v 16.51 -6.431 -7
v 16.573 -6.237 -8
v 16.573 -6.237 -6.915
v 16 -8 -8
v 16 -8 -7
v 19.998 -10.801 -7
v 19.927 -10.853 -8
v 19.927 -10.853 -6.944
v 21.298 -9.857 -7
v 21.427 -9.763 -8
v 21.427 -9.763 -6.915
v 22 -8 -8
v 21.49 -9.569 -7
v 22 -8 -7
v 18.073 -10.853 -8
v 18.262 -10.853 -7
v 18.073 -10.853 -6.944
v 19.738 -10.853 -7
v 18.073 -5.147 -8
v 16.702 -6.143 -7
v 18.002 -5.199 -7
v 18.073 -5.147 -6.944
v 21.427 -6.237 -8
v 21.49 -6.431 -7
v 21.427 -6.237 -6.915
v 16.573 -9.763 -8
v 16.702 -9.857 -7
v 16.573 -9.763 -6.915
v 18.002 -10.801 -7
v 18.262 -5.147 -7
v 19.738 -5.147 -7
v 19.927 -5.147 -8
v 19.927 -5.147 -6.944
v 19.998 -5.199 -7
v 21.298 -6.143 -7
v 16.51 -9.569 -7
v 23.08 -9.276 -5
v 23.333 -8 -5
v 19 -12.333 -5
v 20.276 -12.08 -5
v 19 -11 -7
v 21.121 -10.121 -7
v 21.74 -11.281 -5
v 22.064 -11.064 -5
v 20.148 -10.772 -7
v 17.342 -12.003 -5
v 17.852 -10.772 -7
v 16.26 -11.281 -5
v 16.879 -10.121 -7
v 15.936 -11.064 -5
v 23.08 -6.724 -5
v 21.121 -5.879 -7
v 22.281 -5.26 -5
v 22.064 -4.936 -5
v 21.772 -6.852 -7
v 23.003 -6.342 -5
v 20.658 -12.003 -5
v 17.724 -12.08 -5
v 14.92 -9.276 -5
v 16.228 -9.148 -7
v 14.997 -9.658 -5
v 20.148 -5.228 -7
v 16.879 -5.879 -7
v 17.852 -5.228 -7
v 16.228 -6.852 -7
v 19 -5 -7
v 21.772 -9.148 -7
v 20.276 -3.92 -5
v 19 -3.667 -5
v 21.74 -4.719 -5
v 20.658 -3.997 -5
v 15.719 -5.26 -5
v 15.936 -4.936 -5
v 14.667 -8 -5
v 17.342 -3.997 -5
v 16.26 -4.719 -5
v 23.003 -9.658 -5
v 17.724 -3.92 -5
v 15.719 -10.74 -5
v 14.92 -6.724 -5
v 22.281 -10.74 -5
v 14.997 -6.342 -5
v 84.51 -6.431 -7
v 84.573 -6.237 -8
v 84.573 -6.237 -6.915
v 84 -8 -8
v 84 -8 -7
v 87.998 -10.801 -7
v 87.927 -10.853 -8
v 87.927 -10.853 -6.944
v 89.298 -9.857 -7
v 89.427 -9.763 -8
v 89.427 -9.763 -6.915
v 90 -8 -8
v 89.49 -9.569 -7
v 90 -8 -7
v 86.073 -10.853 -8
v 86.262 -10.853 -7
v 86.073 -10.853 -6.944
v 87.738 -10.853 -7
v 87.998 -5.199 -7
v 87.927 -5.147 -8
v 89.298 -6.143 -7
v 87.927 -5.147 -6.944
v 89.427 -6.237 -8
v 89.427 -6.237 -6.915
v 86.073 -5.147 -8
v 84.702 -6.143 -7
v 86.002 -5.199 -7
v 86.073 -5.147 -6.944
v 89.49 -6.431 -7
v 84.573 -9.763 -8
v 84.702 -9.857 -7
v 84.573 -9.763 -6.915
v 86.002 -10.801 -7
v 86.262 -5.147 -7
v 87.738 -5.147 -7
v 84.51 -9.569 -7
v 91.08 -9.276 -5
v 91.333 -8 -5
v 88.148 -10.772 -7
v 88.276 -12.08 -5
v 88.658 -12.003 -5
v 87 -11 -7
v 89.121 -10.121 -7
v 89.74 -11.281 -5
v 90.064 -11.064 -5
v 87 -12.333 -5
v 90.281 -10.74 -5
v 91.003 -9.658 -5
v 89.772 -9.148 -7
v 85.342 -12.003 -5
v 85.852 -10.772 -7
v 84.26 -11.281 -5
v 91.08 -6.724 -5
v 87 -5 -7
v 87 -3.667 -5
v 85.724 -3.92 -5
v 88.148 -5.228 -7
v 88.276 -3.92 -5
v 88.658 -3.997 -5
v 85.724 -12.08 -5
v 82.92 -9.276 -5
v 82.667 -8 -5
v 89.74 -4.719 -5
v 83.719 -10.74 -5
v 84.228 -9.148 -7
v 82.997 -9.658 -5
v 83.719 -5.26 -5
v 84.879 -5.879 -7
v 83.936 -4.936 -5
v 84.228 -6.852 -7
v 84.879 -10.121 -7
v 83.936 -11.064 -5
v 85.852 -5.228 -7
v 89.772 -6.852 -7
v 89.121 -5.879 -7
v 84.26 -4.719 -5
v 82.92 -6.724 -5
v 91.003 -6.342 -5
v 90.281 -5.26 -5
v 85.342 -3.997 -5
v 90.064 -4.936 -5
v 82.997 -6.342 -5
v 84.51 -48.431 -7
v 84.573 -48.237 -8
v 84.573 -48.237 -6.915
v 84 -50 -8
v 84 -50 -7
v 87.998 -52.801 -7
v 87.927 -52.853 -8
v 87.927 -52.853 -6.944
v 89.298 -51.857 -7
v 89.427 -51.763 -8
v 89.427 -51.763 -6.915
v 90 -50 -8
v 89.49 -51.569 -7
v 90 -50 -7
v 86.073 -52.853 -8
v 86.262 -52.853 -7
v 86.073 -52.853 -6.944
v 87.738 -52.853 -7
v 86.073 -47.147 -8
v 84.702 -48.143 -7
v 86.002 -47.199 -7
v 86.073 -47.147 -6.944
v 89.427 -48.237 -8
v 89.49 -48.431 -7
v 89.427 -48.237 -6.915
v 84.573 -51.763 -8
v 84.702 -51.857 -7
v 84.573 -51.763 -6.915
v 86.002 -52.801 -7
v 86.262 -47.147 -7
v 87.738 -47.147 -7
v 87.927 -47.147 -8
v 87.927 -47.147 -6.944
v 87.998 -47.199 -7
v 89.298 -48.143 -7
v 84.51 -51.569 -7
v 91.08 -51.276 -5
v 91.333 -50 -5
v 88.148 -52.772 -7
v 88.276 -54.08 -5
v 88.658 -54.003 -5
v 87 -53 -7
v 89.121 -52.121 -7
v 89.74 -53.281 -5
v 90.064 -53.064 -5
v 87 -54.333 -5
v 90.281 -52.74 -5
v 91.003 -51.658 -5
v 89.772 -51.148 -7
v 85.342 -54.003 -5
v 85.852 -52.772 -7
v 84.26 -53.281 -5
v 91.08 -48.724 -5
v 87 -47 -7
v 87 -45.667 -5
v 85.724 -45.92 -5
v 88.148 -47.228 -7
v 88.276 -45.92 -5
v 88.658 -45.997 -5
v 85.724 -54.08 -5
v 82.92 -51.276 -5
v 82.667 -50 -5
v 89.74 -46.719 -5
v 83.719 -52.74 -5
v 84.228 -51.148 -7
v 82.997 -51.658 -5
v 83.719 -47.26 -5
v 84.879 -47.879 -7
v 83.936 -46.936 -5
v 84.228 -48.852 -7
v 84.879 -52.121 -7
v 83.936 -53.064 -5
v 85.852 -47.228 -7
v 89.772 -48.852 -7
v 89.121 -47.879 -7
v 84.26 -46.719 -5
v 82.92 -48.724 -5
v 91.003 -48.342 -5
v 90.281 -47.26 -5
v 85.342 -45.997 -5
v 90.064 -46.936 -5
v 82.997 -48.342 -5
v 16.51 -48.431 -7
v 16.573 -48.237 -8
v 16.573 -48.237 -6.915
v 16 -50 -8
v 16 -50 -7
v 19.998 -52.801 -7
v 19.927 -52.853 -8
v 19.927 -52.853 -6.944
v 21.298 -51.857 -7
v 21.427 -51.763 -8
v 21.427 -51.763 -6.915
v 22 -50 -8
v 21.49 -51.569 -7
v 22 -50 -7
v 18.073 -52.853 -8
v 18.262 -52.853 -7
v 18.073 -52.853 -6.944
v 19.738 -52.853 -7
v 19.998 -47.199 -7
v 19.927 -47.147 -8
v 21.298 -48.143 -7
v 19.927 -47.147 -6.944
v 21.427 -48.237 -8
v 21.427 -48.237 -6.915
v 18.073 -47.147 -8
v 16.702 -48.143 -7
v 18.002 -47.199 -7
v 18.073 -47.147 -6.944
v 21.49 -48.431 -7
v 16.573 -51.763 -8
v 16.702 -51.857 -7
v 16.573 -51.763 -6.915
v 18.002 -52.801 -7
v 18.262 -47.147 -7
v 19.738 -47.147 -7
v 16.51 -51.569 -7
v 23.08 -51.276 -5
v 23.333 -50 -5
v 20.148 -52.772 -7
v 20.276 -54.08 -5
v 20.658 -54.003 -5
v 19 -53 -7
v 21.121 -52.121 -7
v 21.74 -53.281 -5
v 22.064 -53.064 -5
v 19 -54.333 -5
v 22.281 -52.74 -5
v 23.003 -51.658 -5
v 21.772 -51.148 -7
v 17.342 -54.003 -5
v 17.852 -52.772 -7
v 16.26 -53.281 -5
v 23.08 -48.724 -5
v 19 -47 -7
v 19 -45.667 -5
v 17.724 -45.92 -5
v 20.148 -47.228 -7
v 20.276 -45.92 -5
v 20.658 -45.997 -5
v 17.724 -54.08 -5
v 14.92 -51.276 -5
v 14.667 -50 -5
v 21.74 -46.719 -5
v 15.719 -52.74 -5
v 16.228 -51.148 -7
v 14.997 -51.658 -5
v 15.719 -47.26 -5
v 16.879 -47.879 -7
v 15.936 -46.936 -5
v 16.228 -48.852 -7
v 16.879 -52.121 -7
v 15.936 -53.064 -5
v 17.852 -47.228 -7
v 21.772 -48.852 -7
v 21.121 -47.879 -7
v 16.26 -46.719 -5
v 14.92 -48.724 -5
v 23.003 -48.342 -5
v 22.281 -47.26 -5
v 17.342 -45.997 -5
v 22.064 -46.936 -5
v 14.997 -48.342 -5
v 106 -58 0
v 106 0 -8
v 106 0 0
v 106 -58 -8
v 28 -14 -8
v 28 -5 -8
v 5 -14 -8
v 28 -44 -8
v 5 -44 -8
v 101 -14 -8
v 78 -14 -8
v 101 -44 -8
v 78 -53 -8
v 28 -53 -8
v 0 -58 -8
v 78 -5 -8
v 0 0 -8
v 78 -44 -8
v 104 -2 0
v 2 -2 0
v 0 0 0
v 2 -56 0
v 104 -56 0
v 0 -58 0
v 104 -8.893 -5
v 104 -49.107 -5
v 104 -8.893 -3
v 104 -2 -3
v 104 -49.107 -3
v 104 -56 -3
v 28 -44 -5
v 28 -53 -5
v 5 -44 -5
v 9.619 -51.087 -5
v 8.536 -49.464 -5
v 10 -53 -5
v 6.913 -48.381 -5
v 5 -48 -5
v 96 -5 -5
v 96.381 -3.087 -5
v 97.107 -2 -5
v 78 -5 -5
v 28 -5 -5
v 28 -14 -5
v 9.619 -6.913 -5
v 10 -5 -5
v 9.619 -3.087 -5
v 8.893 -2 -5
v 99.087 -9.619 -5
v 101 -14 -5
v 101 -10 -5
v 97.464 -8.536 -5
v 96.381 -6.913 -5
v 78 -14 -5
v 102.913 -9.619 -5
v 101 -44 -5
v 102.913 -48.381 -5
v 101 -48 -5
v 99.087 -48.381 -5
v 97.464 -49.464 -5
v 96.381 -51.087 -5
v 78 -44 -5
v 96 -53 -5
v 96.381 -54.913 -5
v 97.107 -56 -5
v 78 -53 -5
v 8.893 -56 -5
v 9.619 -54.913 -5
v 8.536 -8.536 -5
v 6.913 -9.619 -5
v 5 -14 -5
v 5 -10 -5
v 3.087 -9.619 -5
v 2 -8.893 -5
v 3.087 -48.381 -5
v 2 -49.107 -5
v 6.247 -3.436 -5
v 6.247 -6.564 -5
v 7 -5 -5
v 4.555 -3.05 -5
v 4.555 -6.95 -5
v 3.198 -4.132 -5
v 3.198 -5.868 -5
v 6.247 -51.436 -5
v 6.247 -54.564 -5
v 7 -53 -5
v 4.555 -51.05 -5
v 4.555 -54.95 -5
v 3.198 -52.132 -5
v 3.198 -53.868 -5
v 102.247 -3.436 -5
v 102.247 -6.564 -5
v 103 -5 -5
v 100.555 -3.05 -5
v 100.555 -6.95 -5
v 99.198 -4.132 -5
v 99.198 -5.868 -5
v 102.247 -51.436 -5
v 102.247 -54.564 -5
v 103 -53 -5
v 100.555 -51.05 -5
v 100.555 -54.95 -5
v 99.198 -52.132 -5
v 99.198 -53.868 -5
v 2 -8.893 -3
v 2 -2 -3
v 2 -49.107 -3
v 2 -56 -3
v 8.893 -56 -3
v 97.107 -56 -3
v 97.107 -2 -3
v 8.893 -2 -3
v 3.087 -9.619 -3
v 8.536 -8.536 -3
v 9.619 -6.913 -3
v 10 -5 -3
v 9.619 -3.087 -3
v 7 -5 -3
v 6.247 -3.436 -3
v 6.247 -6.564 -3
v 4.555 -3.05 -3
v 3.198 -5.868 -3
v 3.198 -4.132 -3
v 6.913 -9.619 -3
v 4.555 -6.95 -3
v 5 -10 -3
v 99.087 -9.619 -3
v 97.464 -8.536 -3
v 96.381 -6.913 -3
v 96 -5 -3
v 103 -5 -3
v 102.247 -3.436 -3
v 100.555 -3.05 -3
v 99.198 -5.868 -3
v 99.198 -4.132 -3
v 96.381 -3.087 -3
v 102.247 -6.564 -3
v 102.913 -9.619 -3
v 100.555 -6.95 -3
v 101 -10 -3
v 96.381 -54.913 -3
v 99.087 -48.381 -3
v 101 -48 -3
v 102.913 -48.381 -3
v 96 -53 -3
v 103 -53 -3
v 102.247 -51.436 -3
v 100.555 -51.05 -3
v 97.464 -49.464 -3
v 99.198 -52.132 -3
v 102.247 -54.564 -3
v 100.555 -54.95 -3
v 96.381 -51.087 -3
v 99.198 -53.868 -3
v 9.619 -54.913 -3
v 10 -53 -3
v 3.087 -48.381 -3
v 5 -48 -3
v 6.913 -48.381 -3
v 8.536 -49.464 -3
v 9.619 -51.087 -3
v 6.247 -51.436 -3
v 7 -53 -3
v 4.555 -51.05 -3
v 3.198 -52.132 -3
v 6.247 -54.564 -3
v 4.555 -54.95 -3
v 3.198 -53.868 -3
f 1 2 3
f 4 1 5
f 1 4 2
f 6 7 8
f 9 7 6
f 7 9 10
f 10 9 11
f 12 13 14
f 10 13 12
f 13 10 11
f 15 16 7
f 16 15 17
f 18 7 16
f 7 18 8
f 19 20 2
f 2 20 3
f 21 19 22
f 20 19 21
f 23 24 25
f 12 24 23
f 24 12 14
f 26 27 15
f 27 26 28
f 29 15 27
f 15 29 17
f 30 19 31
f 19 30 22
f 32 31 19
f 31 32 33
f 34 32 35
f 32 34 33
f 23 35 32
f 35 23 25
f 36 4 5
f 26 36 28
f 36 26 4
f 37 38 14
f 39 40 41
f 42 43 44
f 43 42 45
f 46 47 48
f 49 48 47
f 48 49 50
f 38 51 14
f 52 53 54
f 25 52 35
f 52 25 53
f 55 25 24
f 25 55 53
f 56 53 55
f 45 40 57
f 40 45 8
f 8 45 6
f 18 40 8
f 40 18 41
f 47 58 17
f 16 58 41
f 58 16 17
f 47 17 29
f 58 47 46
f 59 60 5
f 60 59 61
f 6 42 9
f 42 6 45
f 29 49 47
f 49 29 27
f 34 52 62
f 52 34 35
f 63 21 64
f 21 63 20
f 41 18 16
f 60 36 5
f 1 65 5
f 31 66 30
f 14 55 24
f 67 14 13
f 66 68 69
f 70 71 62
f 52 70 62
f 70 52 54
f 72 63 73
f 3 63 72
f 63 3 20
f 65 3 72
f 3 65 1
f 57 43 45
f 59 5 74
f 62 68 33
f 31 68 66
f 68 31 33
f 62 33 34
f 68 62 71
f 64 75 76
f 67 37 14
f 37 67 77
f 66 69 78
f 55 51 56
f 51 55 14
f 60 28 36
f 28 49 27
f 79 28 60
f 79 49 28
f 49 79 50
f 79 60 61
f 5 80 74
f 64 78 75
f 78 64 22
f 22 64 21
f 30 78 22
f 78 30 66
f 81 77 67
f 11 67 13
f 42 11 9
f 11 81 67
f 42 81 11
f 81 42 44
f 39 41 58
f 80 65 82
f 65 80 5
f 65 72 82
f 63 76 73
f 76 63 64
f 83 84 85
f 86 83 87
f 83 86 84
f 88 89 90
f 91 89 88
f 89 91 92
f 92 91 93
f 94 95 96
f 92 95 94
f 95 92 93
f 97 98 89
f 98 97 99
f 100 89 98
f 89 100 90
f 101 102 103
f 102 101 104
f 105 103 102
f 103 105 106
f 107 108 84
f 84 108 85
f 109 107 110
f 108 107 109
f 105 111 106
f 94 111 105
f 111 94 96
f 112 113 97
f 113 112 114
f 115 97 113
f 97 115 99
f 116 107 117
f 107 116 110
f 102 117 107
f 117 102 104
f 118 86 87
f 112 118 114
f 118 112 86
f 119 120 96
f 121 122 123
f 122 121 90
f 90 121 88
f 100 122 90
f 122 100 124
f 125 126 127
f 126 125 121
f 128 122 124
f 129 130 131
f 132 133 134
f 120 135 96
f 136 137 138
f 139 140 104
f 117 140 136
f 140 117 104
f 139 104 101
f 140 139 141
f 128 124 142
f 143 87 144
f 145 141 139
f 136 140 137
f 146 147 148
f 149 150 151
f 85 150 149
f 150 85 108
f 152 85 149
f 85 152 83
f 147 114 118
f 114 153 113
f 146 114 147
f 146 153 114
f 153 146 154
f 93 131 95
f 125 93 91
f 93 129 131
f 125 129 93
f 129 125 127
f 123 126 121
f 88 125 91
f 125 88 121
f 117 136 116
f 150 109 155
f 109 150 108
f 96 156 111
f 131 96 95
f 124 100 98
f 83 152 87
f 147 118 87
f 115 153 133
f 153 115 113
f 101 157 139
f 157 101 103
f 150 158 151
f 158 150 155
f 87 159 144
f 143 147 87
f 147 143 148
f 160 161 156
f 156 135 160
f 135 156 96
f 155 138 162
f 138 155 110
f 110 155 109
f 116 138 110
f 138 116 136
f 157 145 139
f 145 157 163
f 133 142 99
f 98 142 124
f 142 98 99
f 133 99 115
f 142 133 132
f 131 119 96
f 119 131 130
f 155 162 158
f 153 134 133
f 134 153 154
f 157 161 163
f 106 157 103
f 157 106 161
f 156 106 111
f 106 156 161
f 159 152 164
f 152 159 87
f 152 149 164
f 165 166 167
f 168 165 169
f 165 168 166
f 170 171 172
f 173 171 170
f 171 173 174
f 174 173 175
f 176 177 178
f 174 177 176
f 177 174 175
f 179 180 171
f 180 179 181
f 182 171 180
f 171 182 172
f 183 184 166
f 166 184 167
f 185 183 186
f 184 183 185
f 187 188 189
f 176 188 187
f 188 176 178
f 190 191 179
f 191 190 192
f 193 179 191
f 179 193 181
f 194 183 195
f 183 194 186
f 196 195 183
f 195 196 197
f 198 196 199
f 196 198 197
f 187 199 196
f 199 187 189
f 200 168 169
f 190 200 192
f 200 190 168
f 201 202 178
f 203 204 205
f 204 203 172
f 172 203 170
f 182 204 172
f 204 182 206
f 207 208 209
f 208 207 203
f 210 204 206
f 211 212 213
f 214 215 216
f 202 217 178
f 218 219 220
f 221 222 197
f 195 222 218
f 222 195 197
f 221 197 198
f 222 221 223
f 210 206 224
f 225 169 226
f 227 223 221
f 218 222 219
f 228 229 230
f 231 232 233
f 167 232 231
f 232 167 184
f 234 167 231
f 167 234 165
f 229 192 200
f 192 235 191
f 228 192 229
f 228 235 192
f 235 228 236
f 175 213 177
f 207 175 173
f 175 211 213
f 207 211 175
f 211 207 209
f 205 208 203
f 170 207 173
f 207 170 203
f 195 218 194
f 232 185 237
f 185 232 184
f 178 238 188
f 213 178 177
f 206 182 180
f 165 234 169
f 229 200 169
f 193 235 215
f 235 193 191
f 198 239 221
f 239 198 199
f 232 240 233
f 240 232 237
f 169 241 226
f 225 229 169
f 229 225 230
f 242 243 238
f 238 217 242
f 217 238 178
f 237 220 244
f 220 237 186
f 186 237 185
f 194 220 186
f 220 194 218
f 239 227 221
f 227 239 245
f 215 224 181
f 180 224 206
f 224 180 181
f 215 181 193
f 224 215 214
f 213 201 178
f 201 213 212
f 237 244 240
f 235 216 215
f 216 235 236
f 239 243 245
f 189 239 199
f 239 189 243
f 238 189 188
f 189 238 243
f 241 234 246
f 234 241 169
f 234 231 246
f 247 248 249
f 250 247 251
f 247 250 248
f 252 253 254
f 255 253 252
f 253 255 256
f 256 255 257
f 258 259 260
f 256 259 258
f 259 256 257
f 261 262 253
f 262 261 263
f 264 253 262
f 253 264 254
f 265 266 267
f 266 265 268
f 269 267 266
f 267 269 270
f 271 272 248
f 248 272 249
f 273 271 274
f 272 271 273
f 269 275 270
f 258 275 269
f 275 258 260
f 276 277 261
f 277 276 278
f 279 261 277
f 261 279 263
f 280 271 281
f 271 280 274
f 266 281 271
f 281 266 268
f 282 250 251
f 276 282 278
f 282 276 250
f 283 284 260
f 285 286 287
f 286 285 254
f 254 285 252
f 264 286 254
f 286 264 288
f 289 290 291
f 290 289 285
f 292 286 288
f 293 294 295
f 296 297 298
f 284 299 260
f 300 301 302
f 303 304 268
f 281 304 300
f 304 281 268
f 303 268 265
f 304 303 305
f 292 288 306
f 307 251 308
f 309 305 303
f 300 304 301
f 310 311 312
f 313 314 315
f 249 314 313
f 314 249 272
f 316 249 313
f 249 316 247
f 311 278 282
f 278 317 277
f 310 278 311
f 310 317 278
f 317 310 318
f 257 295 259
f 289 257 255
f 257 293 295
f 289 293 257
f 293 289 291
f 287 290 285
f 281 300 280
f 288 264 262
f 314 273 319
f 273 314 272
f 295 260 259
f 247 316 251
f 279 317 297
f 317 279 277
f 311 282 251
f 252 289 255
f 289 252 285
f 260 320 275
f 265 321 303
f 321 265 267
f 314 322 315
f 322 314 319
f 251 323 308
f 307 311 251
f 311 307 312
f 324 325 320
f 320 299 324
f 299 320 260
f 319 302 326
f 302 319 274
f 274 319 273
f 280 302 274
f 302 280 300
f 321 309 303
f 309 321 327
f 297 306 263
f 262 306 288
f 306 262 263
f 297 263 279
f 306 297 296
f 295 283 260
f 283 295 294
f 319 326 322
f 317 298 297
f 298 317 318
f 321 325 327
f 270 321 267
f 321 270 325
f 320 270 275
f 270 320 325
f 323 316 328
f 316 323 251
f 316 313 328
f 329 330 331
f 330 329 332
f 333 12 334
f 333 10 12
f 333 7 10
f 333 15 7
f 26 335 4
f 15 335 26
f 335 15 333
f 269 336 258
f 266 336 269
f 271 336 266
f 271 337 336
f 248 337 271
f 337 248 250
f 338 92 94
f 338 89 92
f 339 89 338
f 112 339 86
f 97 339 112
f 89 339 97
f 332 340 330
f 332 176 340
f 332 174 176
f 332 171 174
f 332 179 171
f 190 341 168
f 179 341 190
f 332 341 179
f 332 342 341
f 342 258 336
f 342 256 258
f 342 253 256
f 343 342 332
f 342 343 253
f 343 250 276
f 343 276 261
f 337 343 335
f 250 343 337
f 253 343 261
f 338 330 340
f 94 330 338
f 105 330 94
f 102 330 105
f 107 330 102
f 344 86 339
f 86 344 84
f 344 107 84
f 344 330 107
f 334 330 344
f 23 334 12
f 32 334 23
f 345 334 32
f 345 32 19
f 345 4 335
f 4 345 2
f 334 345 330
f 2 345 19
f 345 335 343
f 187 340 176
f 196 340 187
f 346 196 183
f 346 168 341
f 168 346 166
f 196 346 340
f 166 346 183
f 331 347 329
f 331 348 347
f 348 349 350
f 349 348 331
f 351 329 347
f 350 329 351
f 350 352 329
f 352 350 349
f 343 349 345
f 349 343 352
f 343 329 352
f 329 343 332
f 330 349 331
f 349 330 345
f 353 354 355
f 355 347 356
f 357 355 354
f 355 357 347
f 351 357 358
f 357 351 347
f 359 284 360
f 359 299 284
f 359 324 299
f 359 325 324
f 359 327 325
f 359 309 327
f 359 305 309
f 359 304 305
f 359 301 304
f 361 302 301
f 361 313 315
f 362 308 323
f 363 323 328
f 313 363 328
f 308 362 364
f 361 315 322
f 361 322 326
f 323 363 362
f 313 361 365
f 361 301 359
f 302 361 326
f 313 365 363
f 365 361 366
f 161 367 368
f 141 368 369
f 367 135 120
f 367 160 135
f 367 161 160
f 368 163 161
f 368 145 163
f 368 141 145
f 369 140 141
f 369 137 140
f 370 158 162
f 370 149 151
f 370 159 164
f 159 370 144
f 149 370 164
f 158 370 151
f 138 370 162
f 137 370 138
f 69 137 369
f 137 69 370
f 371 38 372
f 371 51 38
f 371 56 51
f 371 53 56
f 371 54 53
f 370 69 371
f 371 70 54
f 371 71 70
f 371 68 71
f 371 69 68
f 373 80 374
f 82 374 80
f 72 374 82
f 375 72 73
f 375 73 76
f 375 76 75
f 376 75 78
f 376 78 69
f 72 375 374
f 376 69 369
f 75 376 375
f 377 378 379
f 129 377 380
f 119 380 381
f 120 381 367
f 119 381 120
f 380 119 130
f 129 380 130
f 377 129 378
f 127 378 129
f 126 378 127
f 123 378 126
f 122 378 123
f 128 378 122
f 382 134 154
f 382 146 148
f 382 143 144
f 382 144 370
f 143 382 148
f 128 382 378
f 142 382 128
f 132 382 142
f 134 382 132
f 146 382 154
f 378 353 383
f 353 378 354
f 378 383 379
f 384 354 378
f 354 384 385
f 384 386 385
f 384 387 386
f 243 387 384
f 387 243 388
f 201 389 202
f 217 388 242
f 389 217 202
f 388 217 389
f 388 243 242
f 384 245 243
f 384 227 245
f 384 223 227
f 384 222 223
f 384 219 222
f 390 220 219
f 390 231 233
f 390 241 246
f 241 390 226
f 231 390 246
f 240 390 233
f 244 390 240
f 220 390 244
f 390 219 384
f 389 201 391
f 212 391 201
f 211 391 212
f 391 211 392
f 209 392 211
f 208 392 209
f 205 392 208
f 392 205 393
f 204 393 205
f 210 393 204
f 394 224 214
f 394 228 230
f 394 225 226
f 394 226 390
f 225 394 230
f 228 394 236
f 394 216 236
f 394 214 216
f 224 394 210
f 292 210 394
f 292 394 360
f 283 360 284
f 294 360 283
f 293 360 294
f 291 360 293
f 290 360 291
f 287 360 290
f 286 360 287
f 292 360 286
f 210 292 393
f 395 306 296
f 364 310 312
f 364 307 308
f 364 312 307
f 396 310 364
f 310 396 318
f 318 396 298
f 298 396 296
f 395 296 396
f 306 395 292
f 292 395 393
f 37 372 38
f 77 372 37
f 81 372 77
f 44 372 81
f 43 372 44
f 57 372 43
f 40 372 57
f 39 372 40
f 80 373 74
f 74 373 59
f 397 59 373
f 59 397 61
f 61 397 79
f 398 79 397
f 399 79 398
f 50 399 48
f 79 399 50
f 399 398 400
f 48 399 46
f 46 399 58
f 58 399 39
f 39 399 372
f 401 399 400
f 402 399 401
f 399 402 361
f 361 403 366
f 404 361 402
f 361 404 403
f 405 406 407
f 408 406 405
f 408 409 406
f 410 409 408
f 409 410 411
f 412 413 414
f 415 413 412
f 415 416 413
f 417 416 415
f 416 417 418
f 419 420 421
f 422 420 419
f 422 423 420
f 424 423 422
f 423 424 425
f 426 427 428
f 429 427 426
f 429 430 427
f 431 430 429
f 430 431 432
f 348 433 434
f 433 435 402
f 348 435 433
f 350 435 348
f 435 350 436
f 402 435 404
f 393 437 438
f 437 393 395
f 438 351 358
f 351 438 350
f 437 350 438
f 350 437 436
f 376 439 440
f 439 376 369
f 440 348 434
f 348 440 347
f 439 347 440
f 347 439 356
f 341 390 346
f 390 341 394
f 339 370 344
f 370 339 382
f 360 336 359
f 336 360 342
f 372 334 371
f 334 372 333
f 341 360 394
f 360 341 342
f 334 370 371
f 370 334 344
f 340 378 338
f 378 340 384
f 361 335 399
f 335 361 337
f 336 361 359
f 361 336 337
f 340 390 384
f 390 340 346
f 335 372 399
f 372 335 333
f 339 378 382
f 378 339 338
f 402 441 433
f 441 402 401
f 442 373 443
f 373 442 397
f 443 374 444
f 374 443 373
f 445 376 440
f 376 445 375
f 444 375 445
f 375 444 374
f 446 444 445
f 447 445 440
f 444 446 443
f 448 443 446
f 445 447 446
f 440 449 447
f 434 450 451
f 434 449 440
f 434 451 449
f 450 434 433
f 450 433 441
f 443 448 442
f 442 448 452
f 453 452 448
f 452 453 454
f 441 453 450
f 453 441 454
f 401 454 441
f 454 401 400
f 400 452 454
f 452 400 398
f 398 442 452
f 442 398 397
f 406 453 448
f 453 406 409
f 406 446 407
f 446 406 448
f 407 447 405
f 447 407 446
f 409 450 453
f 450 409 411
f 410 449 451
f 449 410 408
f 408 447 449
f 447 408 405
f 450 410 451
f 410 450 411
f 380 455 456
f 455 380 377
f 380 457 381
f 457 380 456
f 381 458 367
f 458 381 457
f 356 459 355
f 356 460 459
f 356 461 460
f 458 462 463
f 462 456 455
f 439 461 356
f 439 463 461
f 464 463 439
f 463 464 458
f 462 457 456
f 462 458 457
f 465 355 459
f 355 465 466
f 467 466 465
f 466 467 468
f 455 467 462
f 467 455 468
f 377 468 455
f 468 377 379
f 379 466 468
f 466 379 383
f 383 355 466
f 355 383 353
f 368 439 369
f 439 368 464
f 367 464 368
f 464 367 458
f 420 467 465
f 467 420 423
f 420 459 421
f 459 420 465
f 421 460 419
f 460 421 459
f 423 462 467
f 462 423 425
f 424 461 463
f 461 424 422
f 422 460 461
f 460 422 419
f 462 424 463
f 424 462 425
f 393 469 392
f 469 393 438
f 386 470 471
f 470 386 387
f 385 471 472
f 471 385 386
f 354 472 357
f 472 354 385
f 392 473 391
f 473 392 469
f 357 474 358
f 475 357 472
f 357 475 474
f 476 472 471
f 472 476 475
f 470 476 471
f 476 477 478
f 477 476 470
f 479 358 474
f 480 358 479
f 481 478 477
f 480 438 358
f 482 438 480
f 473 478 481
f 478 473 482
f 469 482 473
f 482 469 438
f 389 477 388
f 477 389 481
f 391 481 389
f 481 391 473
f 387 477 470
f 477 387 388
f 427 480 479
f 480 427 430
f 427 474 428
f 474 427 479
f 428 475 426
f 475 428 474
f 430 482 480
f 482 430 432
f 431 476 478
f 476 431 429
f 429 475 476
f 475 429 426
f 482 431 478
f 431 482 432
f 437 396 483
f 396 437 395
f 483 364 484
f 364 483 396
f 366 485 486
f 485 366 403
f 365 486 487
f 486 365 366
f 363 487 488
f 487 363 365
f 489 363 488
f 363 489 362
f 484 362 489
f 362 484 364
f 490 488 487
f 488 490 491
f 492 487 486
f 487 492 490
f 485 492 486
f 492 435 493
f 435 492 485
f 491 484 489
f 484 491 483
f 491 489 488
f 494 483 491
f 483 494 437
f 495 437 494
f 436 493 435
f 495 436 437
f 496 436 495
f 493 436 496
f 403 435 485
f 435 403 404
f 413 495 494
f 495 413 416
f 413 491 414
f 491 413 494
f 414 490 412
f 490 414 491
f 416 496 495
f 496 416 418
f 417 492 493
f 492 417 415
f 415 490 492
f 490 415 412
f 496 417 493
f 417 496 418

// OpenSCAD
// [FL_INDEX: keywords="openscad, 3d_parametric, PCB_Mounter, csg_solid" | COT="Parametric OpenSCAD design from 3DCodeverse"]
// Title: PCB Mounter

// Give the PCB Measurements below.
// DO NOT ADD ANY EXTRA MARGIN AS THAT IS ALREADY CALCULATED

pcbwidth = 100;
pcblength = 52;

// DO NOT CHANGE ANYTHING BELOW THIS LINE
rotate(a=[180,0,0]){
	difference(){
		cube([pcbwidth+6,pcblength+6,8]);
		translate([2,2,0])
			cube([pcbwidth+2,pcblength+2,5]);
		translate([19,8,4],center=true){
			cylinder(h=10,r=3);
			cylinder(h=3,r1=5,r2=3);
		}
		translate([pcbwidth-13,8,4],center=true){
			cylinder(h=10,r=3);
			cylinder(h=3,r1=5,r2=3);
		}
		translate([pcbwidth-13,pcblength-2,4],center=true){
			cylinder(h=10,r=3);
			cylinder(h=3,r1=5,r2=3);
		}
		translate([19,pcblength-2,4],center=true){
			cylinder(h=10,r=3);
			cylinder(h=3,r1=5,r2=3);
		}
		translate([28,5,0])
			cube([pcbwidth-50,pcblength-4,8]);
		translate([5,14,0])
			cube([pcbwidth-4,pcblength-22,8]);
	}
	translate([5,5,3])
	difference(){
		cylinder(h=5,r=5);
		cylinder(h=5,r=2);
	}
	translate([pcbwidth+1,5,3])
	difference(){
		cylinder(h=5,r=5);
		cylinder(h=5,r=2);
	}
	translate([pcbwidth+1,pcblength+1,3])
	difference(){
		cylinder(h=5,r=5);
		cylinder(h=5,r=2);
	}
	translate([5,pcblength+1,3])
	difference(){
		cylinder(h=5,r=5);
		cylinder(h=5,r=2);
	}
	echo("The PCB has a dimention of ", pcbwidth, "x", pcblength, "mm");
	echo("The PCBHolder will have a final dimension of ", pcbwidth+6, "x", pcblength+6, "mm");
}
